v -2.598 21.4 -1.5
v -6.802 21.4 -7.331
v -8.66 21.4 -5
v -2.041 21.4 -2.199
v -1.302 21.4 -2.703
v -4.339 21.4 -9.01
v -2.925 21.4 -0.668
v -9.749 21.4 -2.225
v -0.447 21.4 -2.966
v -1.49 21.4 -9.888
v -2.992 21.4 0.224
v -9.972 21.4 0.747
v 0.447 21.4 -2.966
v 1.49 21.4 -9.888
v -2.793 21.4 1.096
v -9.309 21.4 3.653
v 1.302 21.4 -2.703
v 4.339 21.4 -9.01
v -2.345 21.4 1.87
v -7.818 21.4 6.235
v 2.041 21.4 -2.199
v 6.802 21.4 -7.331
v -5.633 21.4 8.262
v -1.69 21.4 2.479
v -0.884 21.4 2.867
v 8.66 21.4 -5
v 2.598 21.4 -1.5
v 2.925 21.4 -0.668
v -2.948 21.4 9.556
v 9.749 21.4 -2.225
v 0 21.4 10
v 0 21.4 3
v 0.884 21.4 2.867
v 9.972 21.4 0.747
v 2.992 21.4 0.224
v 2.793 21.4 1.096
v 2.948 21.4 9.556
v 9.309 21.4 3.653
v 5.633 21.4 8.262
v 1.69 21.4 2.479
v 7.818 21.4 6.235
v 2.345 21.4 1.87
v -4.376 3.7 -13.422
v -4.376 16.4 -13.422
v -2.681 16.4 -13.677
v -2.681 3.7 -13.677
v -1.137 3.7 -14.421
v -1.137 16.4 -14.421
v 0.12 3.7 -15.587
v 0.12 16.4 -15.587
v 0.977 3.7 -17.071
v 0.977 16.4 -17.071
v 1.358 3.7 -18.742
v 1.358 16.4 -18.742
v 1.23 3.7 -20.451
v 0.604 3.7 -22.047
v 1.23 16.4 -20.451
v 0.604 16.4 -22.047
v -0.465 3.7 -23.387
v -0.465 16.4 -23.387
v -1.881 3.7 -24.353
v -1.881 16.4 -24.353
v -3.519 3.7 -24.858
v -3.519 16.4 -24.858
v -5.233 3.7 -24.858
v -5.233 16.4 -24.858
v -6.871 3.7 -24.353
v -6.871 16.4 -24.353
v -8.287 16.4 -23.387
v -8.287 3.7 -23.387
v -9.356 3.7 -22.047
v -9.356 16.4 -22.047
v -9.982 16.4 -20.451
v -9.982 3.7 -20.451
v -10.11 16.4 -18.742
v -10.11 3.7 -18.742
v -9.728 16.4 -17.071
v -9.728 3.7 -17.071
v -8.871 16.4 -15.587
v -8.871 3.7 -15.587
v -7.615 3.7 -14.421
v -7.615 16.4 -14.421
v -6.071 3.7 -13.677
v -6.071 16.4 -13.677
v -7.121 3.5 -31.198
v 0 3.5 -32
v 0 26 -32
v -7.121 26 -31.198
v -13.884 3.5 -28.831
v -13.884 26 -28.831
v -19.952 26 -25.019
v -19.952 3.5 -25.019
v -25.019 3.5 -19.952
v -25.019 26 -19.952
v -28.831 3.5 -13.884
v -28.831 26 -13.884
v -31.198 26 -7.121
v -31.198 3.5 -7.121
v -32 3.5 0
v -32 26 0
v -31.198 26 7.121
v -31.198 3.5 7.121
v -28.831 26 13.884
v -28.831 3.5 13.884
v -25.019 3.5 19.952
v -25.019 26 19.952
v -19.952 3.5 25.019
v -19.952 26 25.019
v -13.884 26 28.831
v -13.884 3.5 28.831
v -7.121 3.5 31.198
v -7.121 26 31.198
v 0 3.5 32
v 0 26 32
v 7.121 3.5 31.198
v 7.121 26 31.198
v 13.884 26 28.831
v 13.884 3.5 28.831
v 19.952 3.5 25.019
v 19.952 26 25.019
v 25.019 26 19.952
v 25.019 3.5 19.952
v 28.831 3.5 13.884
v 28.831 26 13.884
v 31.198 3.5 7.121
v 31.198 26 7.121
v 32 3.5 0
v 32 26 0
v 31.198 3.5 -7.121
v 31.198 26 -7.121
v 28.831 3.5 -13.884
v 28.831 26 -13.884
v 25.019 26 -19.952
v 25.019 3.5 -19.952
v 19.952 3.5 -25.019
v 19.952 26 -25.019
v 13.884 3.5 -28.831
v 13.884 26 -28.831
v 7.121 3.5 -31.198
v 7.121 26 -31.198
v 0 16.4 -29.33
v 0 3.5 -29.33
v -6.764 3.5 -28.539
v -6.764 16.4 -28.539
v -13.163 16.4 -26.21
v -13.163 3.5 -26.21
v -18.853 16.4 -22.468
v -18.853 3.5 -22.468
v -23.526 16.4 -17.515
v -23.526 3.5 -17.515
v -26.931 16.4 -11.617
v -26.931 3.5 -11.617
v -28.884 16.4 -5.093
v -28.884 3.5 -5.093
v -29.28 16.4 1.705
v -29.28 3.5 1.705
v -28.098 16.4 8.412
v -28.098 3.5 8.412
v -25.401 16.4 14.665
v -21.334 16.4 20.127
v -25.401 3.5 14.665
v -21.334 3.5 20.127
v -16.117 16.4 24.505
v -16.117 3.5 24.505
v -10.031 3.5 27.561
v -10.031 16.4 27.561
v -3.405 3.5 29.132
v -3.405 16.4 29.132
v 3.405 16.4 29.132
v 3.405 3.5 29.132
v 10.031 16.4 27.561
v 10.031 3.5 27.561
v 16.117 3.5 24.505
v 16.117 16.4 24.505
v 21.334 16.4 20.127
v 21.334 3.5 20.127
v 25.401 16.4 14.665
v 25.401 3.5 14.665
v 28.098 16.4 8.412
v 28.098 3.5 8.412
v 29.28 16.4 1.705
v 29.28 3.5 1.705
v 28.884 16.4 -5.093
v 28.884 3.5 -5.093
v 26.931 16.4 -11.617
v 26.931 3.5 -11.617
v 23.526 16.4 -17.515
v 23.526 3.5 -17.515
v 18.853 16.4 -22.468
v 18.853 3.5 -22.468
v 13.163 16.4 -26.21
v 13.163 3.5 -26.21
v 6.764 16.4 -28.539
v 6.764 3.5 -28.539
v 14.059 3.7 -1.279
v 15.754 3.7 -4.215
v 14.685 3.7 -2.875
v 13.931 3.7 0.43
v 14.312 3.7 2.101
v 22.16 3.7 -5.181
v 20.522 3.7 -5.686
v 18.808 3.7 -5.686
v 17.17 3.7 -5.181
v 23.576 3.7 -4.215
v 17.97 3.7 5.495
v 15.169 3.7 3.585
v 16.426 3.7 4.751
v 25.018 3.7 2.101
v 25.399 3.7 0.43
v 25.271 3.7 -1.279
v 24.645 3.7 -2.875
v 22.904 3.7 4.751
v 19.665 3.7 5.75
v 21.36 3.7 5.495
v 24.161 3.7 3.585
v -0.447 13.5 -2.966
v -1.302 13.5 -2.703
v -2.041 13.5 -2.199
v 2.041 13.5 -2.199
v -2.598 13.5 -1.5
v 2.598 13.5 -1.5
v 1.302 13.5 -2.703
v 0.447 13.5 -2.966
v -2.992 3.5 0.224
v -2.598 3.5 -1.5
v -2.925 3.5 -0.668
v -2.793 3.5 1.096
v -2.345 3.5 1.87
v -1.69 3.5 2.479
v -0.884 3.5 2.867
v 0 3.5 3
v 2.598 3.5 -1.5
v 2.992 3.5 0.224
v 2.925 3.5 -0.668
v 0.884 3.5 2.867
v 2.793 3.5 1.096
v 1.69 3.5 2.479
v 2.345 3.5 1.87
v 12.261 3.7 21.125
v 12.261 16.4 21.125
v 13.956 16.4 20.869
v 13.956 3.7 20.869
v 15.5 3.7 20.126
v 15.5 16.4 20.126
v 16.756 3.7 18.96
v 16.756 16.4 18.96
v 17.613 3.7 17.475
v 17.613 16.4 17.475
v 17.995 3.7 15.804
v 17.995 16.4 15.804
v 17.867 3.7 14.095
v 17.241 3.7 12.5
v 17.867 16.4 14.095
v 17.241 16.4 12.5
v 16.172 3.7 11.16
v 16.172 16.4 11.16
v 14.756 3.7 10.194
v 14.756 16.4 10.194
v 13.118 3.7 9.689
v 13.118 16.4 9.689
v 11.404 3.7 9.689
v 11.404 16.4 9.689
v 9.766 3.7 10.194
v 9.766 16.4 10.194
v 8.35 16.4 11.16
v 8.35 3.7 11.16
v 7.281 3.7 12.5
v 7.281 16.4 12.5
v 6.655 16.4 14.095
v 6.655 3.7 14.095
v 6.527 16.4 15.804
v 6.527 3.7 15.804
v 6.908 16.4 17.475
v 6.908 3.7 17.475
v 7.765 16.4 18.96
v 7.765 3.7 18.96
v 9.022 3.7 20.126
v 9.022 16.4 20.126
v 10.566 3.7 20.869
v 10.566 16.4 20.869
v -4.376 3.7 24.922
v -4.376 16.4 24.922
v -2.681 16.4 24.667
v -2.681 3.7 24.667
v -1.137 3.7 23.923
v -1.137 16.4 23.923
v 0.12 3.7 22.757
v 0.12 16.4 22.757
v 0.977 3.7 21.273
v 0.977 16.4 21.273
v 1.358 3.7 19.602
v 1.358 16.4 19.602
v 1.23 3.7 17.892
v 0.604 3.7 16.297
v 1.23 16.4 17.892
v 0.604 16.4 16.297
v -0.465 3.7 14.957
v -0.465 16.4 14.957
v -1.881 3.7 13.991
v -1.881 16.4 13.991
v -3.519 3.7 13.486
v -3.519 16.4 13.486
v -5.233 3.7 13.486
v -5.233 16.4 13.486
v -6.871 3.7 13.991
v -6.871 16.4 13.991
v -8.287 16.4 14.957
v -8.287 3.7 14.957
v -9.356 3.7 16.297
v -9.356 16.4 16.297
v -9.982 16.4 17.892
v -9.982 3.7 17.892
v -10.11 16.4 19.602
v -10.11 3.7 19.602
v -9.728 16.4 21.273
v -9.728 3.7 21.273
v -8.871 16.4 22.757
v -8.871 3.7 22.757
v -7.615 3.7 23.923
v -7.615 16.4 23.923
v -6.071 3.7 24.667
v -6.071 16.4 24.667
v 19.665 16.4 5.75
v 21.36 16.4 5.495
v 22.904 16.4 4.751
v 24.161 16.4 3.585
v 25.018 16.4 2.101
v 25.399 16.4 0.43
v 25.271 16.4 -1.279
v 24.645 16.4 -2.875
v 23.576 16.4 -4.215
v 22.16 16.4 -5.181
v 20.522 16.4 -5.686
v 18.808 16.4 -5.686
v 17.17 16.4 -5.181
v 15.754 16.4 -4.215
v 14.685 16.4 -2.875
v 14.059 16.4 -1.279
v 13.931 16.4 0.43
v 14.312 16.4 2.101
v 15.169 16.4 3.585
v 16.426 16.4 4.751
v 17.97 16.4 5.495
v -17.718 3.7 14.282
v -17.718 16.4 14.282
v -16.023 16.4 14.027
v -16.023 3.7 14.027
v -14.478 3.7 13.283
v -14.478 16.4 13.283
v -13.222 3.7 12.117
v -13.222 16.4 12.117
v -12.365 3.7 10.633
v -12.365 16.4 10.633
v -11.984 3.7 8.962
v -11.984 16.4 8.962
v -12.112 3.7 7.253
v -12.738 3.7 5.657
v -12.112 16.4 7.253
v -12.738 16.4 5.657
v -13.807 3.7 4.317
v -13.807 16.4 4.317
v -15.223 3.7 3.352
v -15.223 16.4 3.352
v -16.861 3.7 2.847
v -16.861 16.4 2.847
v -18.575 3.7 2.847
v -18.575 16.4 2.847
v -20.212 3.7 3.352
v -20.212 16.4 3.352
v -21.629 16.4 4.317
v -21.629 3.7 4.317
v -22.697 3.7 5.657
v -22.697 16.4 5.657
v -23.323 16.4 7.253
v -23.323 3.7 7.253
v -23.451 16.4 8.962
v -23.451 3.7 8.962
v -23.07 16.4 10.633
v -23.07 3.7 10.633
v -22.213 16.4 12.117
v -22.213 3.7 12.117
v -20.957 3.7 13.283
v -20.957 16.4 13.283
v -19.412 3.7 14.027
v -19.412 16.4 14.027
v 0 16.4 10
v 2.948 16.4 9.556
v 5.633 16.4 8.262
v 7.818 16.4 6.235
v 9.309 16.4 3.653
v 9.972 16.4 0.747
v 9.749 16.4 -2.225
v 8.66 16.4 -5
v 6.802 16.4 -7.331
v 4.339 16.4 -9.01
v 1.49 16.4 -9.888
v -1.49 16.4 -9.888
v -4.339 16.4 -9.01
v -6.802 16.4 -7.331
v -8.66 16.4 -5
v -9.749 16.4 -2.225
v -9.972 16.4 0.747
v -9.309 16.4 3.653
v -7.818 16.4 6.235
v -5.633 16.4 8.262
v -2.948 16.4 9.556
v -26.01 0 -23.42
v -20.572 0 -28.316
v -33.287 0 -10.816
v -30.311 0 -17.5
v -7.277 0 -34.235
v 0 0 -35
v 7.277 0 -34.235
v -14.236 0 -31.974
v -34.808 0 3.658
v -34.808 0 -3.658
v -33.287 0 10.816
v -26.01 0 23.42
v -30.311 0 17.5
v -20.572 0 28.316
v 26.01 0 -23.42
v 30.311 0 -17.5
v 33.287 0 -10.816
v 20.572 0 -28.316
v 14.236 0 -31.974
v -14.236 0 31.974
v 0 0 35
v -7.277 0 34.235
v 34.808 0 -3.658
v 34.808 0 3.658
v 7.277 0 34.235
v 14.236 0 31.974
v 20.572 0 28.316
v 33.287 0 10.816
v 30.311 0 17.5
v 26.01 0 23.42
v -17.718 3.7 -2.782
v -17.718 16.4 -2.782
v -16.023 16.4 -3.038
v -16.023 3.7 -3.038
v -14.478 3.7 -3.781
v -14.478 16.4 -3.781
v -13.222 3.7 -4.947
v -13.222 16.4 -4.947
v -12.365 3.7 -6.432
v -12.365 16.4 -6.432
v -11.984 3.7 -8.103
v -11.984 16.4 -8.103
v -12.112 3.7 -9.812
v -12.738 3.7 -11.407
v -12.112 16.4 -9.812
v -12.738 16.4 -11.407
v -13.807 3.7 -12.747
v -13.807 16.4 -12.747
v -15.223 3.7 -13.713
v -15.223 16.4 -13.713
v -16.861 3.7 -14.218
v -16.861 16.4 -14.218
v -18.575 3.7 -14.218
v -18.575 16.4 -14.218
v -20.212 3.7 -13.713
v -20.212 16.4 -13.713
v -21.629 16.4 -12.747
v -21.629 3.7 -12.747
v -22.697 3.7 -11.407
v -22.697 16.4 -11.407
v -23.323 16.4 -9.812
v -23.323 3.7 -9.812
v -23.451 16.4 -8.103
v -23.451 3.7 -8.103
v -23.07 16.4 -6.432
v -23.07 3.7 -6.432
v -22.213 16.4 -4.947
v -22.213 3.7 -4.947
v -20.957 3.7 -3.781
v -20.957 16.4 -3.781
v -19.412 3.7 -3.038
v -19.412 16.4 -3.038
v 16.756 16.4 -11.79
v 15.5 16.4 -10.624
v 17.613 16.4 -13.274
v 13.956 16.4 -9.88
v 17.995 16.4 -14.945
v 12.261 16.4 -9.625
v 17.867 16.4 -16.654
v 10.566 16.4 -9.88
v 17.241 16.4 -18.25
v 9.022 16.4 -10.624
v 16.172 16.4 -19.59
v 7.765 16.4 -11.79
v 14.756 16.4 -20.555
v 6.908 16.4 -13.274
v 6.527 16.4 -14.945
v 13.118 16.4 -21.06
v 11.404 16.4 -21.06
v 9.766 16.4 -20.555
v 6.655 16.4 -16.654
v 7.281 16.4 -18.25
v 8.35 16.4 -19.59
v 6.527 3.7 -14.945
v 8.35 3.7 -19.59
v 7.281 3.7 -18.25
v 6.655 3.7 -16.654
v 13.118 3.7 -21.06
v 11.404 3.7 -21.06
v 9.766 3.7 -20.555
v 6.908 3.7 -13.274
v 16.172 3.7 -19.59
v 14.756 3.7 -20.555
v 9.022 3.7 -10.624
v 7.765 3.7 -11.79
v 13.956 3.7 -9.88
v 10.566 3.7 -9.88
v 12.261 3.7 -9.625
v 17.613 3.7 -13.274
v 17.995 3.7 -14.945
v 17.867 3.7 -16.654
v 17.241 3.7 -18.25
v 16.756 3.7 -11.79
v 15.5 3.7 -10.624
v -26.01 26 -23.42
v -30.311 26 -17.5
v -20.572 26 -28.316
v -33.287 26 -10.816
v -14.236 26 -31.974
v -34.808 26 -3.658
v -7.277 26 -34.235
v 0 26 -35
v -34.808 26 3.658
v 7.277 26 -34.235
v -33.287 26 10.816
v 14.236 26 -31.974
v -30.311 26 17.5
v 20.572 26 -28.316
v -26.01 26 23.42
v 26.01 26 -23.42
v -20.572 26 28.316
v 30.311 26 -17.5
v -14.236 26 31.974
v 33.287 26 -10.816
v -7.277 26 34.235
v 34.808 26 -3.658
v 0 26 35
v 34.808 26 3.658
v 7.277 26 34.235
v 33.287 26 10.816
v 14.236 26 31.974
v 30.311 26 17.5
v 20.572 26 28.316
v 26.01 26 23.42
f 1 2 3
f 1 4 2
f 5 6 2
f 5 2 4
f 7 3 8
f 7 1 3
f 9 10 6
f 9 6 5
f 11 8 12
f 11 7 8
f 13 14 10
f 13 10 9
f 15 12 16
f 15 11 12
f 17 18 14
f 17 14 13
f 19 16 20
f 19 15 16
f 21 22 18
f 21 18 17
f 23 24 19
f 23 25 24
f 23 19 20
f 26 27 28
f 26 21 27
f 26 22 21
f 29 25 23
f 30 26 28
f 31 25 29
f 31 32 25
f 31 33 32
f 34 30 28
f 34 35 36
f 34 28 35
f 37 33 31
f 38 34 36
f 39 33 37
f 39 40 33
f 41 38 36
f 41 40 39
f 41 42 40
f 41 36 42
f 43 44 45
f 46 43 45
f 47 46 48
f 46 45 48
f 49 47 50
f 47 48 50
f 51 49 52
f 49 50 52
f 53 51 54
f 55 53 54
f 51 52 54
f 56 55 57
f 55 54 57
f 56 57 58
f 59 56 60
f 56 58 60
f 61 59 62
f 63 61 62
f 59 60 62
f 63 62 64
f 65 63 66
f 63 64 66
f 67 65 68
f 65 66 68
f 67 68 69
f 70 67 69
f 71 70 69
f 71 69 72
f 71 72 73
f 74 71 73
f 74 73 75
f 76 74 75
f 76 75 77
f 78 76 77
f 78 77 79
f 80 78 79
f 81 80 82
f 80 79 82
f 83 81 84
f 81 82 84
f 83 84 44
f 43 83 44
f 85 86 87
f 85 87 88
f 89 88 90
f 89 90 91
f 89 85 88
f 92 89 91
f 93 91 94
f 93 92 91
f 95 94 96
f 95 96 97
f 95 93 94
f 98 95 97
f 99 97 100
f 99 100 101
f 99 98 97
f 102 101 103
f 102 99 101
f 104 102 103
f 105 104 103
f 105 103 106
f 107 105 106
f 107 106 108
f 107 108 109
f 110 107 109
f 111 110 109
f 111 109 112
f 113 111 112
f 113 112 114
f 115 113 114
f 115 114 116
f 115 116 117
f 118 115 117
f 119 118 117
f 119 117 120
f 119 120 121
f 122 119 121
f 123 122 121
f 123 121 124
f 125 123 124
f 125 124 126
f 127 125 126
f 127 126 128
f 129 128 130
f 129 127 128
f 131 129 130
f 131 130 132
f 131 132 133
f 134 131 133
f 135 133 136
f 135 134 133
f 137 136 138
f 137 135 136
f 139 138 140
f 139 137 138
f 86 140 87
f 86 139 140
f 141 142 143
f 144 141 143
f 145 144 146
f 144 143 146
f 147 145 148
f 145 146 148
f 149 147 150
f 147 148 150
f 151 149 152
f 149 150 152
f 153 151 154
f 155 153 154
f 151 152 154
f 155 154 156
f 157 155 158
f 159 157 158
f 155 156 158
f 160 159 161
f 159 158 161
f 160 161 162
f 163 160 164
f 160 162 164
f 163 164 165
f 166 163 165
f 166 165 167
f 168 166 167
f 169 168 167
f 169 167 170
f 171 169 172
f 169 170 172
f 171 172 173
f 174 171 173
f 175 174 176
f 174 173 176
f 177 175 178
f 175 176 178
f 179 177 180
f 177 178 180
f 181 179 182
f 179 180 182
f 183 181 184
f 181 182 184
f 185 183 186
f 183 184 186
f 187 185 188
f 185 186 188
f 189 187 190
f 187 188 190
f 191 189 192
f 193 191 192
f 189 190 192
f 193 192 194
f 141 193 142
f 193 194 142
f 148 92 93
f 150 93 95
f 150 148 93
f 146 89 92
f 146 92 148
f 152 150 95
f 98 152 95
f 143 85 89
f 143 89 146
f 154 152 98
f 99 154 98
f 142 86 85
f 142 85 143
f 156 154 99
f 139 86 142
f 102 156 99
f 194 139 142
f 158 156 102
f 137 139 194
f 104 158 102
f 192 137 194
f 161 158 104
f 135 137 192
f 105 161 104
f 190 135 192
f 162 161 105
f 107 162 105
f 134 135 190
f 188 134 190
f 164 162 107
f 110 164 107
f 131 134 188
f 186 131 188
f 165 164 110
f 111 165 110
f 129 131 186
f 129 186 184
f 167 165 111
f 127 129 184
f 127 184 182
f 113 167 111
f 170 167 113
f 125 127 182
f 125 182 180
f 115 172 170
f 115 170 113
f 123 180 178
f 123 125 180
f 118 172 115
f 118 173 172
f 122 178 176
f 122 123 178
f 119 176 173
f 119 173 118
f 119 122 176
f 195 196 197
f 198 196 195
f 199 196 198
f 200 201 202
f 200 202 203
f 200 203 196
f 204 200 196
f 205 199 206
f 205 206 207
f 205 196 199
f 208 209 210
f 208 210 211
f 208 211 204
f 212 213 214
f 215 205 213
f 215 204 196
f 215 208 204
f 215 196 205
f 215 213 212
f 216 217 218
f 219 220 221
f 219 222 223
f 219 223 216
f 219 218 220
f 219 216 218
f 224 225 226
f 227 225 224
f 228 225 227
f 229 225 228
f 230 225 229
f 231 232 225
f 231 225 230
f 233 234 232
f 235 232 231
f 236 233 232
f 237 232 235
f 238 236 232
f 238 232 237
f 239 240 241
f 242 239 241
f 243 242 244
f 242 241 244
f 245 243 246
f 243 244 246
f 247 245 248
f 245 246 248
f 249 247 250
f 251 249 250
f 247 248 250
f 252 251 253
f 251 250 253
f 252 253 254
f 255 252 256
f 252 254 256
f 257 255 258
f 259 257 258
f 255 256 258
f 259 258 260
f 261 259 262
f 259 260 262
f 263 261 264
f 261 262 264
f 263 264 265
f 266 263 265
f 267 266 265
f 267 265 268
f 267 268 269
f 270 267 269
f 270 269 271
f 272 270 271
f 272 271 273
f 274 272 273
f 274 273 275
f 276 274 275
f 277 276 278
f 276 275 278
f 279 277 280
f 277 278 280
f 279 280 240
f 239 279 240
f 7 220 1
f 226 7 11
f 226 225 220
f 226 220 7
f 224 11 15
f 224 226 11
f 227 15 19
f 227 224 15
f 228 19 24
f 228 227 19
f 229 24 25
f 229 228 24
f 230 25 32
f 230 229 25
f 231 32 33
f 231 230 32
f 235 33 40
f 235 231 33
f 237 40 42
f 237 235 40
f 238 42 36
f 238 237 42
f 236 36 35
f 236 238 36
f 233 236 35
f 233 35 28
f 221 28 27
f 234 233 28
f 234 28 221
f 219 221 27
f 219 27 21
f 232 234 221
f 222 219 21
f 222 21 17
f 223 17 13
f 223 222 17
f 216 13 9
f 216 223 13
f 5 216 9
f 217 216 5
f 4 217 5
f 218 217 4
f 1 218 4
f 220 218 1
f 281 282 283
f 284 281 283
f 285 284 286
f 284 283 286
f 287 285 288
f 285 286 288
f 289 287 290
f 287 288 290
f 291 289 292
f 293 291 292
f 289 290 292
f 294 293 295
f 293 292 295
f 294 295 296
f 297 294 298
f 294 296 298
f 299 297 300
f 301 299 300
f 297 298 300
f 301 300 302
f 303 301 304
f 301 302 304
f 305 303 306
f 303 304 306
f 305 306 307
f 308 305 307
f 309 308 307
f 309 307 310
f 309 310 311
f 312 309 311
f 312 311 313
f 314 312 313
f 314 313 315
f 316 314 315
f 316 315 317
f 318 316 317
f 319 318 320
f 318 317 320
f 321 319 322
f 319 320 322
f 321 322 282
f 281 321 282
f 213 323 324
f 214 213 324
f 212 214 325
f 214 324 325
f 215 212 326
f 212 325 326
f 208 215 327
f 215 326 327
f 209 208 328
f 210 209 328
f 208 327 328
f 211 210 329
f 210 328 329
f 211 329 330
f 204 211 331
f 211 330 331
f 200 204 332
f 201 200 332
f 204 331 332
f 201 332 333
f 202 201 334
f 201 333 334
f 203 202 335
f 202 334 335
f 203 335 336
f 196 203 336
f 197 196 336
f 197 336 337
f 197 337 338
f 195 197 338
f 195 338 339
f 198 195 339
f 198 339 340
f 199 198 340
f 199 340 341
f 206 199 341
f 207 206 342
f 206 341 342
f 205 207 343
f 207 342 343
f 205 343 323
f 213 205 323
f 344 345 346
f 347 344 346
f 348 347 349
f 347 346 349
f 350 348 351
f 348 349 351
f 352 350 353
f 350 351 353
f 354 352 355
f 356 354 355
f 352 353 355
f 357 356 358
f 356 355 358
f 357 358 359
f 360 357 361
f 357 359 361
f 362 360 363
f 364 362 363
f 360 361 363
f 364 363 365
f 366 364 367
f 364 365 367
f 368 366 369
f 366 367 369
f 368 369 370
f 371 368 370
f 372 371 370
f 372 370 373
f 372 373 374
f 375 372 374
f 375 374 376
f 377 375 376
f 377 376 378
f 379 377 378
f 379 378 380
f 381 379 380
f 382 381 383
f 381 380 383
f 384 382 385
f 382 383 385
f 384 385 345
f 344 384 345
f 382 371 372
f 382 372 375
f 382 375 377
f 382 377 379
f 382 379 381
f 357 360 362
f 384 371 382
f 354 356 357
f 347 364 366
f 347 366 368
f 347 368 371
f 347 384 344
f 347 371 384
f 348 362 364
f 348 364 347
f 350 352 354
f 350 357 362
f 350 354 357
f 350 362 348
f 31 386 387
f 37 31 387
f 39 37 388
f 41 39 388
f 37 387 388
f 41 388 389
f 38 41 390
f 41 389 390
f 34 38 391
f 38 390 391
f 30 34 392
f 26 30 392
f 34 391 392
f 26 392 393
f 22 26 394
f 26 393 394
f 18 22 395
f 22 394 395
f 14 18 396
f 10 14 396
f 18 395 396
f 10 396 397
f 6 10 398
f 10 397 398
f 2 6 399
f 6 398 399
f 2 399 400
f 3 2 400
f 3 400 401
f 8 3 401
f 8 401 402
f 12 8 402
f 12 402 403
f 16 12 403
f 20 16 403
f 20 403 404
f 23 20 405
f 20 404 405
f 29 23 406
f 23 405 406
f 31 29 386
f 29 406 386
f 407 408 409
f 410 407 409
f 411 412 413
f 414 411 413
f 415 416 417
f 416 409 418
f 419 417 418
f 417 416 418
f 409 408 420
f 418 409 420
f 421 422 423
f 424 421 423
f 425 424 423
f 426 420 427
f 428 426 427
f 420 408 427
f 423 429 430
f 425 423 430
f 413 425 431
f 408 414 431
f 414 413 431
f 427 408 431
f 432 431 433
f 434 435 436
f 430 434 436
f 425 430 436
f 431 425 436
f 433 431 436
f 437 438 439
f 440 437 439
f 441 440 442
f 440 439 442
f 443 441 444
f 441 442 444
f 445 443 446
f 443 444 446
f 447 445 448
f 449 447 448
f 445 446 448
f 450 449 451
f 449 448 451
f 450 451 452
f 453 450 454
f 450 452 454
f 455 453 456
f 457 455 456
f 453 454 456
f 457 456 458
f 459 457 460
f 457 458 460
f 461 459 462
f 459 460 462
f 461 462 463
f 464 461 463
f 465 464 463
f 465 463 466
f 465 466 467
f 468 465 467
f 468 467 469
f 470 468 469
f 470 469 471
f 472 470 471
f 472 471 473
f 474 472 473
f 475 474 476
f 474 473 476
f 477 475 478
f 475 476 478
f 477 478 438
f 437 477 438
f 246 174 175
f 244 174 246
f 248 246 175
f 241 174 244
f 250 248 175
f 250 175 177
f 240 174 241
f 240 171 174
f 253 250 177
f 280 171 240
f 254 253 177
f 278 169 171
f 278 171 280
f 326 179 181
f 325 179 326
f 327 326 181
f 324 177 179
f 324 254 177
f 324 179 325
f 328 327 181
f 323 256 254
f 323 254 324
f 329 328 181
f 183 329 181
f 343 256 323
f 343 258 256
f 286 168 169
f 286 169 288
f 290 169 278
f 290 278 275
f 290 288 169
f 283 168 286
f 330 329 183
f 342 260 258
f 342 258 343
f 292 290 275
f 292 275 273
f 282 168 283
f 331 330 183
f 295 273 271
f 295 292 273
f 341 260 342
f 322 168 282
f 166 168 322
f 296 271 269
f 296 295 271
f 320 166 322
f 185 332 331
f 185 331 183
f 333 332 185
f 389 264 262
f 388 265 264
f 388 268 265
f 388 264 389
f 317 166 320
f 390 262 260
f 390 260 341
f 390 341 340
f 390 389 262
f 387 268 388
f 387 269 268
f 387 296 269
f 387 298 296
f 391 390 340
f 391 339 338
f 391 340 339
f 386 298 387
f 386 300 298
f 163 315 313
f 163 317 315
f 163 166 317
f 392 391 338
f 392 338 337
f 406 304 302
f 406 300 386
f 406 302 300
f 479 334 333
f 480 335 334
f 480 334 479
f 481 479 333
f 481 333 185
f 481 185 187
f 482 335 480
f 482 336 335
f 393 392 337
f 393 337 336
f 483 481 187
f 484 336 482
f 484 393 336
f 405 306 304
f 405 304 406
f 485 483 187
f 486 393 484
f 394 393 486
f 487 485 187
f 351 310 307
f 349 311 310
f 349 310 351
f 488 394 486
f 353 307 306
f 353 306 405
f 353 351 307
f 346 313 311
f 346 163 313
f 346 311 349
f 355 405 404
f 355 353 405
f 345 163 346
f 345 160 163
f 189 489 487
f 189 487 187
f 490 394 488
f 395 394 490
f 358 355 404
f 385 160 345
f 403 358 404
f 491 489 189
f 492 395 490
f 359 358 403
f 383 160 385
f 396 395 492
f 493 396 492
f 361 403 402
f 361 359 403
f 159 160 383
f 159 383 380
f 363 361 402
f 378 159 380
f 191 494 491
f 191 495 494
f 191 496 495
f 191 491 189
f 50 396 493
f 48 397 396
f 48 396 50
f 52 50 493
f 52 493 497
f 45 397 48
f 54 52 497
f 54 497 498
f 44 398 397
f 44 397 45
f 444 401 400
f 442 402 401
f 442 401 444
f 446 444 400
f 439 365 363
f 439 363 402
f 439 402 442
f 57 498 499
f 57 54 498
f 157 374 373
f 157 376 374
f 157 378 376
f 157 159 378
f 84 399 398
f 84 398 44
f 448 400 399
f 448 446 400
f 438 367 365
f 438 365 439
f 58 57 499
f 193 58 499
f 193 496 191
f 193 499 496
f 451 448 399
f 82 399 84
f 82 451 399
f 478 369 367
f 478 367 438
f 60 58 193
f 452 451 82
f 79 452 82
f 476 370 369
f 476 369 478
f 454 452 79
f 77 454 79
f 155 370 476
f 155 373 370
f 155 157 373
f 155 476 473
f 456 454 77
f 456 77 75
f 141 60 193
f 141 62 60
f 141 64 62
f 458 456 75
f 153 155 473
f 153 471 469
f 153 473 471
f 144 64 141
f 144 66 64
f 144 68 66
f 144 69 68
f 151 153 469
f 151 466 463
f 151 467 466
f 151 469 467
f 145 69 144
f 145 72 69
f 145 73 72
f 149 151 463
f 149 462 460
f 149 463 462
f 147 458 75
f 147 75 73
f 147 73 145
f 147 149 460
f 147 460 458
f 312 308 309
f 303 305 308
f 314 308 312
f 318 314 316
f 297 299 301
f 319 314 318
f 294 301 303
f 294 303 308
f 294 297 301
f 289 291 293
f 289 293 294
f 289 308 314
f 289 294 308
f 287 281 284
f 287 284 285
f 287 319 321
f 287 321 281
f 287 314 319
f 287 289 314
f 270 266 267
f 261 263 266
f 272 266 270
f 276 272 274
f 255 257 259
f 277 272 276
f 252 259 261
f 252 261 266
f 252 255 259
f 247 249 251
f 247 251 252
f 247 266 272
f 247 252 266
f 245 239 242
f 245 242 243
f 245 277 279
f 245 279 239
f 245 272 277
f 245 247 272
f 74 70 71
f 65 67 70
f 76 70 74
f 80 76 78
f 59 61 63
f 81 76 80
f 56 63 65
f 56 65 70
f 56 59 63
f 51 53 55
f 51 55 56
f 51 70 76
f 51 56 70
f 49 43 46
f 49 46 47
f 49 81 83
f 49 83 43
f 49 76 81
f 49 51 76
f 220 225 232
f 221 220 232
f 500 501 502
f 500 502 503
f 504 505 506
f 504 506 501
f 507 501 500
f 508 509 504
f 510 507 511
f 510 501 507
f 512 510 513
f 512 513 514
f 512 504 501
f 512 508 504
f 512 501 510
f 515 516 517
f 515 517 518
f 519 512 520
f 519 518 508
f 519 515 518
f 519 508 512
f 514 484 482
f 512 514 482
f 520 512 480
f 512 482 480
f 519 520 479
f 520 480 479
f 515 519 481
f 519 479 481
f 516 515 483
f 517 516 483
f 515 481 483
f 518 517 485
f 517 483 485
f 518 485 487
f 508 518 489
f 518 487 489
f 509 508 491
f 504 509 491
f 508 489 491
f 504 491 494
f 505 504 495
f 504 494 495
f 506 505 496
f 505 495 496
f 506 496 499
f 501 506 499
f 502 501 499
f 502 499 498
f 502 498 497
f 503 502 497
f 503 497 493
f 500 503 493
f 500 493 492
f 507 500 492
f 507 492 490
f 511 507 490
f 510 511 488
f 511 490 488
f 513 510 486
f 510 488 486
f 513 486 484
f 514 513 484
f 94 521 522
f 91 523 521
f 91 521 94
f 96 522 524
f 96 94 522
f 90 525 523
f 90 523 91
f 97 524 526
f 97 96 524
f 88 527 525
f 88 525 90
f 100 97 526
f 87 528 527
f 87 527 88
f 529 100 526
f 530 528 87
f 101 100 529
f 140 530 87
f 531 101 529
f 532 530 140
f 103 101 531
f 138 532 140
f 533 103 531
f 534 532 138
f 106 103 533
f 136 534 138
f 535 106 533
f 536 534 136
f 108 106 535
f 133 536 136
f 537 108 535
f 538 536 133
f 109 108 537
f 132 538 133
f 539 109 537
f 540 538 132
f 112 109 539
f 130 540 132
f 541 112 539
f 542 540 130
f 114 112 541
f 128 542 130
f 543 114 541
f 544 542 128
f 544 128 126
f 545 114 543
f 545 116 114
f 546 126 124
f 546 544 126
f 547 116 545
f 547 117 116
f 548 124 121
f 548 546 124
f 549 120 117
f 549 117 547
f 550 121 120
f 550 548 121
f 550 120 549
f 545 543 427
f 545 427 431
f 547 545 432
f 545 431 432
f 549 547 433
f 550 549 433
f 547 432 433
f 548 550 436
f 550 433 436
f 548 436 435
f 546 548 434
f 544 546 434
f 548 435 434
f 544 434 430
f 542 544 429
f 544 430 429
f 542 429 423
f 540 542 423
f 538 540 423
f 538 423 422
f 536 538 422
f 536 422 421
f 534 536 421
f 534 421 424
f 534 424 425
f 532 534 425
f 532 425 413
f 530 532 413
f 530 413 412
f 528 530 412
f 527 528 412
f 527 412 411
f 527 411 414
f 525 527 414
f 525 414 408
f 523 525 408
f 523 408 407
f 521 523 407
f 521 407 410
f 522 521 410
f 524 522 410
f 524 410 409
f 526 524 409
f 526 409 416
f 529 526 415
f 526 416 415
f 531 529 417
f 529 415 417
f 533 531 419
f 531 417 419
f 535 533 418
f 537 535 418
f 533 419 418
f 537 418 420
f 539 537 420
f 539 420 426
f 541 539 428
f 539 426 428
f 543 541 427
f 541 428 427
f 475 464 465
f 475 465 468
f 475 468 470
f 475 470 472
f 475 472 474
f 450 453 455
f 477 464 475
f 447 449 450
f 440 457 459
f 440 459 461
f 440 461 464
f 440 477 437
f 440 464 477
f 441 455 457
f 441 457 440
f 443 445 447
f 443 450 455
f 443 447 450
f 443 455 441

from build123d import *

# Parameters (mm, degrees)
VOLUME_KNOB_R                      = 35
KNOB_TOP_DEPTH                     = 3.5
VOLUME_KNOB_3_R                    = 35
VOLUME_KNOB_3_R_2                  = 32
KNOB_WALLS_DEPTH                   = 26
KNOB_START                         = 3.5
KNOB_SHAFT_KEYWAY_DEPTH            = 10
VOLUME_KNOB_8_R                    = 29.33
VOLUME_KNOB_8_R_2                  = 3
KNOB_DAMEPNING_EXTENSION_TOP_DEPTH = 12.9
KNOB_START_2                       = 16.4
VOLUME_KNOB_11_R                   = 10
VOLUME_KNOB_11_R_2                 = 3
KNOB_SHAFT_SUPPORT_DEPTH           = 5
SKETCH1_R                          = 5.75
WEIGHT_SLUG_HOLES_DEPTH            = 12.7


with BuildPart() as part:
    # Volume Knob → Knob Top (new body)
    with BuildSketch(Plane(origin=(0, 0, 0), x_dir=(1, 0, 0), z_dir=(0, 1, 0))):
        with Locations(Location((0, 0, 0), (0, 0, 270))):
            Circle(VOLUME_KNOB_R)
    extrude(amount=KNOB_TOP_DEPTH)

    # Volume Knob<3> → Knob Walls (add)
    with BuildSketch(Plane(origin=(0, 0, 0), x_dir=(1, 0, 0), z_dir=(0, 1, 0))):
        with Locations(Location((0, 0, 0), (0, 0, 270))):
            Circle(VOLUME_KNOB_3_R)
        with Locations(Location((0, 0, 0), (0, 0, 90))):
            Circle(VOLUME_KNOB_3_R_2, mode=Mode.SUBTRACT)
    extrude(amount=KNOB_WALLS_DEPTH)

    # Volume Knob<4> → Knob Shaft Keyway (add)
    with BuildSketch(Plane(origin=(0, 0, 0), x_dir=(1, 0, 0), z_dir=(0, 1, 0)).offset(KNOB_START)):
        with BuildLine():
            Line((-2.598076211, 1.5), (2.598076211, 1.5))
            ThreePointArc((2.598076211, 1.5), (0, 3), (-2.598076211, 1.5))
        make_face()
    extrude(amount=KNOB_SHAFT_KEYWAY_DEPTH)

    # Volume Knob<8> → Knob Damepning Extension (top) (add)
    with BuildSketch(Plane(origin=(0, 0, 0), x_dir=(1, 0, 0), z_dir=(0, 1, 0)).offset(KNOB_START)):
        with Locations(Location((0, 0, 0), (0, 0, 90))):
            Circle(VOLUME_KNOB_8_R)
        with Locations(Location((0, 0, 0), (0, 0, 150))):
            Circle(VOLUME_KNOB_8_R_2, mode=Mode.SUBTRACT)
    extrude(amount=KNOB_DAMEPNING_EXTENSION_TOP_DEPTH)

    # Volume Knob<11> → Knob Shaft Support (add)
    with BuildSketch(Plane(origin=(0, 0, 0), x_dir=(1, 0, 0), z_dir=(0, 1, 0)).offset(KNOB_START_2)):
        with Locations(Location((0, 0, 0), (0, 0, 270))):
            Circle(VOLUME_KNOB_11_R)
        with Locations(Location((0, 0, 0), (0, 0, 150))):
            Circle(VOLUME_KNOB_11_R_2, mode=Mode.SUBTRACT)
    extrude(amount=KNOB_SHAFT_SUPPORT_DEPTH)

    # Sketch1 → Weight Slug Holes (cut)
    with BuildSketch(Plane(origin=(0, 16.4, 0), x_dir=(1, 0, 0), z_dir=(0, 1, 0))):
        with Locations(Location((19.665, 0, 0), (0, 0, 270))):
            Circle(SKETCH1_R)
        with Locations(Location((12.260926954, -15.374716103, 0), (0, 0, 270))):
            Circle(SKETCH1_R)
        with Locations(Location((-4.375874166, -19.171957393, 0), (0, 0, 270))):
            Circle(SKETCH1_R)
        with Locations(Location((-17.717552787, -8.53232373, 0), (0, 0, 270))):
            Circle(SKETCH1_R)
        with Locations(Location((-17.717552787, 8.53232373, 0), (0, 0, 270))):
            Circle(SKETCH1_R)
        with Locations(Location((-4.375874166, 19.171957393, 0), (0, 0, 270))):
            Circle(SKETCH1_R)
        with Locations(Location((12.260926954, 15.374716103, 0), (0, 0, 270))):
            Circle(SKETCH1_R)
    extrude(amount=-WEIGHT_SLUG_HOLES_DEPTH, mode=Mode.SUBTRACT)


solid = part.part
